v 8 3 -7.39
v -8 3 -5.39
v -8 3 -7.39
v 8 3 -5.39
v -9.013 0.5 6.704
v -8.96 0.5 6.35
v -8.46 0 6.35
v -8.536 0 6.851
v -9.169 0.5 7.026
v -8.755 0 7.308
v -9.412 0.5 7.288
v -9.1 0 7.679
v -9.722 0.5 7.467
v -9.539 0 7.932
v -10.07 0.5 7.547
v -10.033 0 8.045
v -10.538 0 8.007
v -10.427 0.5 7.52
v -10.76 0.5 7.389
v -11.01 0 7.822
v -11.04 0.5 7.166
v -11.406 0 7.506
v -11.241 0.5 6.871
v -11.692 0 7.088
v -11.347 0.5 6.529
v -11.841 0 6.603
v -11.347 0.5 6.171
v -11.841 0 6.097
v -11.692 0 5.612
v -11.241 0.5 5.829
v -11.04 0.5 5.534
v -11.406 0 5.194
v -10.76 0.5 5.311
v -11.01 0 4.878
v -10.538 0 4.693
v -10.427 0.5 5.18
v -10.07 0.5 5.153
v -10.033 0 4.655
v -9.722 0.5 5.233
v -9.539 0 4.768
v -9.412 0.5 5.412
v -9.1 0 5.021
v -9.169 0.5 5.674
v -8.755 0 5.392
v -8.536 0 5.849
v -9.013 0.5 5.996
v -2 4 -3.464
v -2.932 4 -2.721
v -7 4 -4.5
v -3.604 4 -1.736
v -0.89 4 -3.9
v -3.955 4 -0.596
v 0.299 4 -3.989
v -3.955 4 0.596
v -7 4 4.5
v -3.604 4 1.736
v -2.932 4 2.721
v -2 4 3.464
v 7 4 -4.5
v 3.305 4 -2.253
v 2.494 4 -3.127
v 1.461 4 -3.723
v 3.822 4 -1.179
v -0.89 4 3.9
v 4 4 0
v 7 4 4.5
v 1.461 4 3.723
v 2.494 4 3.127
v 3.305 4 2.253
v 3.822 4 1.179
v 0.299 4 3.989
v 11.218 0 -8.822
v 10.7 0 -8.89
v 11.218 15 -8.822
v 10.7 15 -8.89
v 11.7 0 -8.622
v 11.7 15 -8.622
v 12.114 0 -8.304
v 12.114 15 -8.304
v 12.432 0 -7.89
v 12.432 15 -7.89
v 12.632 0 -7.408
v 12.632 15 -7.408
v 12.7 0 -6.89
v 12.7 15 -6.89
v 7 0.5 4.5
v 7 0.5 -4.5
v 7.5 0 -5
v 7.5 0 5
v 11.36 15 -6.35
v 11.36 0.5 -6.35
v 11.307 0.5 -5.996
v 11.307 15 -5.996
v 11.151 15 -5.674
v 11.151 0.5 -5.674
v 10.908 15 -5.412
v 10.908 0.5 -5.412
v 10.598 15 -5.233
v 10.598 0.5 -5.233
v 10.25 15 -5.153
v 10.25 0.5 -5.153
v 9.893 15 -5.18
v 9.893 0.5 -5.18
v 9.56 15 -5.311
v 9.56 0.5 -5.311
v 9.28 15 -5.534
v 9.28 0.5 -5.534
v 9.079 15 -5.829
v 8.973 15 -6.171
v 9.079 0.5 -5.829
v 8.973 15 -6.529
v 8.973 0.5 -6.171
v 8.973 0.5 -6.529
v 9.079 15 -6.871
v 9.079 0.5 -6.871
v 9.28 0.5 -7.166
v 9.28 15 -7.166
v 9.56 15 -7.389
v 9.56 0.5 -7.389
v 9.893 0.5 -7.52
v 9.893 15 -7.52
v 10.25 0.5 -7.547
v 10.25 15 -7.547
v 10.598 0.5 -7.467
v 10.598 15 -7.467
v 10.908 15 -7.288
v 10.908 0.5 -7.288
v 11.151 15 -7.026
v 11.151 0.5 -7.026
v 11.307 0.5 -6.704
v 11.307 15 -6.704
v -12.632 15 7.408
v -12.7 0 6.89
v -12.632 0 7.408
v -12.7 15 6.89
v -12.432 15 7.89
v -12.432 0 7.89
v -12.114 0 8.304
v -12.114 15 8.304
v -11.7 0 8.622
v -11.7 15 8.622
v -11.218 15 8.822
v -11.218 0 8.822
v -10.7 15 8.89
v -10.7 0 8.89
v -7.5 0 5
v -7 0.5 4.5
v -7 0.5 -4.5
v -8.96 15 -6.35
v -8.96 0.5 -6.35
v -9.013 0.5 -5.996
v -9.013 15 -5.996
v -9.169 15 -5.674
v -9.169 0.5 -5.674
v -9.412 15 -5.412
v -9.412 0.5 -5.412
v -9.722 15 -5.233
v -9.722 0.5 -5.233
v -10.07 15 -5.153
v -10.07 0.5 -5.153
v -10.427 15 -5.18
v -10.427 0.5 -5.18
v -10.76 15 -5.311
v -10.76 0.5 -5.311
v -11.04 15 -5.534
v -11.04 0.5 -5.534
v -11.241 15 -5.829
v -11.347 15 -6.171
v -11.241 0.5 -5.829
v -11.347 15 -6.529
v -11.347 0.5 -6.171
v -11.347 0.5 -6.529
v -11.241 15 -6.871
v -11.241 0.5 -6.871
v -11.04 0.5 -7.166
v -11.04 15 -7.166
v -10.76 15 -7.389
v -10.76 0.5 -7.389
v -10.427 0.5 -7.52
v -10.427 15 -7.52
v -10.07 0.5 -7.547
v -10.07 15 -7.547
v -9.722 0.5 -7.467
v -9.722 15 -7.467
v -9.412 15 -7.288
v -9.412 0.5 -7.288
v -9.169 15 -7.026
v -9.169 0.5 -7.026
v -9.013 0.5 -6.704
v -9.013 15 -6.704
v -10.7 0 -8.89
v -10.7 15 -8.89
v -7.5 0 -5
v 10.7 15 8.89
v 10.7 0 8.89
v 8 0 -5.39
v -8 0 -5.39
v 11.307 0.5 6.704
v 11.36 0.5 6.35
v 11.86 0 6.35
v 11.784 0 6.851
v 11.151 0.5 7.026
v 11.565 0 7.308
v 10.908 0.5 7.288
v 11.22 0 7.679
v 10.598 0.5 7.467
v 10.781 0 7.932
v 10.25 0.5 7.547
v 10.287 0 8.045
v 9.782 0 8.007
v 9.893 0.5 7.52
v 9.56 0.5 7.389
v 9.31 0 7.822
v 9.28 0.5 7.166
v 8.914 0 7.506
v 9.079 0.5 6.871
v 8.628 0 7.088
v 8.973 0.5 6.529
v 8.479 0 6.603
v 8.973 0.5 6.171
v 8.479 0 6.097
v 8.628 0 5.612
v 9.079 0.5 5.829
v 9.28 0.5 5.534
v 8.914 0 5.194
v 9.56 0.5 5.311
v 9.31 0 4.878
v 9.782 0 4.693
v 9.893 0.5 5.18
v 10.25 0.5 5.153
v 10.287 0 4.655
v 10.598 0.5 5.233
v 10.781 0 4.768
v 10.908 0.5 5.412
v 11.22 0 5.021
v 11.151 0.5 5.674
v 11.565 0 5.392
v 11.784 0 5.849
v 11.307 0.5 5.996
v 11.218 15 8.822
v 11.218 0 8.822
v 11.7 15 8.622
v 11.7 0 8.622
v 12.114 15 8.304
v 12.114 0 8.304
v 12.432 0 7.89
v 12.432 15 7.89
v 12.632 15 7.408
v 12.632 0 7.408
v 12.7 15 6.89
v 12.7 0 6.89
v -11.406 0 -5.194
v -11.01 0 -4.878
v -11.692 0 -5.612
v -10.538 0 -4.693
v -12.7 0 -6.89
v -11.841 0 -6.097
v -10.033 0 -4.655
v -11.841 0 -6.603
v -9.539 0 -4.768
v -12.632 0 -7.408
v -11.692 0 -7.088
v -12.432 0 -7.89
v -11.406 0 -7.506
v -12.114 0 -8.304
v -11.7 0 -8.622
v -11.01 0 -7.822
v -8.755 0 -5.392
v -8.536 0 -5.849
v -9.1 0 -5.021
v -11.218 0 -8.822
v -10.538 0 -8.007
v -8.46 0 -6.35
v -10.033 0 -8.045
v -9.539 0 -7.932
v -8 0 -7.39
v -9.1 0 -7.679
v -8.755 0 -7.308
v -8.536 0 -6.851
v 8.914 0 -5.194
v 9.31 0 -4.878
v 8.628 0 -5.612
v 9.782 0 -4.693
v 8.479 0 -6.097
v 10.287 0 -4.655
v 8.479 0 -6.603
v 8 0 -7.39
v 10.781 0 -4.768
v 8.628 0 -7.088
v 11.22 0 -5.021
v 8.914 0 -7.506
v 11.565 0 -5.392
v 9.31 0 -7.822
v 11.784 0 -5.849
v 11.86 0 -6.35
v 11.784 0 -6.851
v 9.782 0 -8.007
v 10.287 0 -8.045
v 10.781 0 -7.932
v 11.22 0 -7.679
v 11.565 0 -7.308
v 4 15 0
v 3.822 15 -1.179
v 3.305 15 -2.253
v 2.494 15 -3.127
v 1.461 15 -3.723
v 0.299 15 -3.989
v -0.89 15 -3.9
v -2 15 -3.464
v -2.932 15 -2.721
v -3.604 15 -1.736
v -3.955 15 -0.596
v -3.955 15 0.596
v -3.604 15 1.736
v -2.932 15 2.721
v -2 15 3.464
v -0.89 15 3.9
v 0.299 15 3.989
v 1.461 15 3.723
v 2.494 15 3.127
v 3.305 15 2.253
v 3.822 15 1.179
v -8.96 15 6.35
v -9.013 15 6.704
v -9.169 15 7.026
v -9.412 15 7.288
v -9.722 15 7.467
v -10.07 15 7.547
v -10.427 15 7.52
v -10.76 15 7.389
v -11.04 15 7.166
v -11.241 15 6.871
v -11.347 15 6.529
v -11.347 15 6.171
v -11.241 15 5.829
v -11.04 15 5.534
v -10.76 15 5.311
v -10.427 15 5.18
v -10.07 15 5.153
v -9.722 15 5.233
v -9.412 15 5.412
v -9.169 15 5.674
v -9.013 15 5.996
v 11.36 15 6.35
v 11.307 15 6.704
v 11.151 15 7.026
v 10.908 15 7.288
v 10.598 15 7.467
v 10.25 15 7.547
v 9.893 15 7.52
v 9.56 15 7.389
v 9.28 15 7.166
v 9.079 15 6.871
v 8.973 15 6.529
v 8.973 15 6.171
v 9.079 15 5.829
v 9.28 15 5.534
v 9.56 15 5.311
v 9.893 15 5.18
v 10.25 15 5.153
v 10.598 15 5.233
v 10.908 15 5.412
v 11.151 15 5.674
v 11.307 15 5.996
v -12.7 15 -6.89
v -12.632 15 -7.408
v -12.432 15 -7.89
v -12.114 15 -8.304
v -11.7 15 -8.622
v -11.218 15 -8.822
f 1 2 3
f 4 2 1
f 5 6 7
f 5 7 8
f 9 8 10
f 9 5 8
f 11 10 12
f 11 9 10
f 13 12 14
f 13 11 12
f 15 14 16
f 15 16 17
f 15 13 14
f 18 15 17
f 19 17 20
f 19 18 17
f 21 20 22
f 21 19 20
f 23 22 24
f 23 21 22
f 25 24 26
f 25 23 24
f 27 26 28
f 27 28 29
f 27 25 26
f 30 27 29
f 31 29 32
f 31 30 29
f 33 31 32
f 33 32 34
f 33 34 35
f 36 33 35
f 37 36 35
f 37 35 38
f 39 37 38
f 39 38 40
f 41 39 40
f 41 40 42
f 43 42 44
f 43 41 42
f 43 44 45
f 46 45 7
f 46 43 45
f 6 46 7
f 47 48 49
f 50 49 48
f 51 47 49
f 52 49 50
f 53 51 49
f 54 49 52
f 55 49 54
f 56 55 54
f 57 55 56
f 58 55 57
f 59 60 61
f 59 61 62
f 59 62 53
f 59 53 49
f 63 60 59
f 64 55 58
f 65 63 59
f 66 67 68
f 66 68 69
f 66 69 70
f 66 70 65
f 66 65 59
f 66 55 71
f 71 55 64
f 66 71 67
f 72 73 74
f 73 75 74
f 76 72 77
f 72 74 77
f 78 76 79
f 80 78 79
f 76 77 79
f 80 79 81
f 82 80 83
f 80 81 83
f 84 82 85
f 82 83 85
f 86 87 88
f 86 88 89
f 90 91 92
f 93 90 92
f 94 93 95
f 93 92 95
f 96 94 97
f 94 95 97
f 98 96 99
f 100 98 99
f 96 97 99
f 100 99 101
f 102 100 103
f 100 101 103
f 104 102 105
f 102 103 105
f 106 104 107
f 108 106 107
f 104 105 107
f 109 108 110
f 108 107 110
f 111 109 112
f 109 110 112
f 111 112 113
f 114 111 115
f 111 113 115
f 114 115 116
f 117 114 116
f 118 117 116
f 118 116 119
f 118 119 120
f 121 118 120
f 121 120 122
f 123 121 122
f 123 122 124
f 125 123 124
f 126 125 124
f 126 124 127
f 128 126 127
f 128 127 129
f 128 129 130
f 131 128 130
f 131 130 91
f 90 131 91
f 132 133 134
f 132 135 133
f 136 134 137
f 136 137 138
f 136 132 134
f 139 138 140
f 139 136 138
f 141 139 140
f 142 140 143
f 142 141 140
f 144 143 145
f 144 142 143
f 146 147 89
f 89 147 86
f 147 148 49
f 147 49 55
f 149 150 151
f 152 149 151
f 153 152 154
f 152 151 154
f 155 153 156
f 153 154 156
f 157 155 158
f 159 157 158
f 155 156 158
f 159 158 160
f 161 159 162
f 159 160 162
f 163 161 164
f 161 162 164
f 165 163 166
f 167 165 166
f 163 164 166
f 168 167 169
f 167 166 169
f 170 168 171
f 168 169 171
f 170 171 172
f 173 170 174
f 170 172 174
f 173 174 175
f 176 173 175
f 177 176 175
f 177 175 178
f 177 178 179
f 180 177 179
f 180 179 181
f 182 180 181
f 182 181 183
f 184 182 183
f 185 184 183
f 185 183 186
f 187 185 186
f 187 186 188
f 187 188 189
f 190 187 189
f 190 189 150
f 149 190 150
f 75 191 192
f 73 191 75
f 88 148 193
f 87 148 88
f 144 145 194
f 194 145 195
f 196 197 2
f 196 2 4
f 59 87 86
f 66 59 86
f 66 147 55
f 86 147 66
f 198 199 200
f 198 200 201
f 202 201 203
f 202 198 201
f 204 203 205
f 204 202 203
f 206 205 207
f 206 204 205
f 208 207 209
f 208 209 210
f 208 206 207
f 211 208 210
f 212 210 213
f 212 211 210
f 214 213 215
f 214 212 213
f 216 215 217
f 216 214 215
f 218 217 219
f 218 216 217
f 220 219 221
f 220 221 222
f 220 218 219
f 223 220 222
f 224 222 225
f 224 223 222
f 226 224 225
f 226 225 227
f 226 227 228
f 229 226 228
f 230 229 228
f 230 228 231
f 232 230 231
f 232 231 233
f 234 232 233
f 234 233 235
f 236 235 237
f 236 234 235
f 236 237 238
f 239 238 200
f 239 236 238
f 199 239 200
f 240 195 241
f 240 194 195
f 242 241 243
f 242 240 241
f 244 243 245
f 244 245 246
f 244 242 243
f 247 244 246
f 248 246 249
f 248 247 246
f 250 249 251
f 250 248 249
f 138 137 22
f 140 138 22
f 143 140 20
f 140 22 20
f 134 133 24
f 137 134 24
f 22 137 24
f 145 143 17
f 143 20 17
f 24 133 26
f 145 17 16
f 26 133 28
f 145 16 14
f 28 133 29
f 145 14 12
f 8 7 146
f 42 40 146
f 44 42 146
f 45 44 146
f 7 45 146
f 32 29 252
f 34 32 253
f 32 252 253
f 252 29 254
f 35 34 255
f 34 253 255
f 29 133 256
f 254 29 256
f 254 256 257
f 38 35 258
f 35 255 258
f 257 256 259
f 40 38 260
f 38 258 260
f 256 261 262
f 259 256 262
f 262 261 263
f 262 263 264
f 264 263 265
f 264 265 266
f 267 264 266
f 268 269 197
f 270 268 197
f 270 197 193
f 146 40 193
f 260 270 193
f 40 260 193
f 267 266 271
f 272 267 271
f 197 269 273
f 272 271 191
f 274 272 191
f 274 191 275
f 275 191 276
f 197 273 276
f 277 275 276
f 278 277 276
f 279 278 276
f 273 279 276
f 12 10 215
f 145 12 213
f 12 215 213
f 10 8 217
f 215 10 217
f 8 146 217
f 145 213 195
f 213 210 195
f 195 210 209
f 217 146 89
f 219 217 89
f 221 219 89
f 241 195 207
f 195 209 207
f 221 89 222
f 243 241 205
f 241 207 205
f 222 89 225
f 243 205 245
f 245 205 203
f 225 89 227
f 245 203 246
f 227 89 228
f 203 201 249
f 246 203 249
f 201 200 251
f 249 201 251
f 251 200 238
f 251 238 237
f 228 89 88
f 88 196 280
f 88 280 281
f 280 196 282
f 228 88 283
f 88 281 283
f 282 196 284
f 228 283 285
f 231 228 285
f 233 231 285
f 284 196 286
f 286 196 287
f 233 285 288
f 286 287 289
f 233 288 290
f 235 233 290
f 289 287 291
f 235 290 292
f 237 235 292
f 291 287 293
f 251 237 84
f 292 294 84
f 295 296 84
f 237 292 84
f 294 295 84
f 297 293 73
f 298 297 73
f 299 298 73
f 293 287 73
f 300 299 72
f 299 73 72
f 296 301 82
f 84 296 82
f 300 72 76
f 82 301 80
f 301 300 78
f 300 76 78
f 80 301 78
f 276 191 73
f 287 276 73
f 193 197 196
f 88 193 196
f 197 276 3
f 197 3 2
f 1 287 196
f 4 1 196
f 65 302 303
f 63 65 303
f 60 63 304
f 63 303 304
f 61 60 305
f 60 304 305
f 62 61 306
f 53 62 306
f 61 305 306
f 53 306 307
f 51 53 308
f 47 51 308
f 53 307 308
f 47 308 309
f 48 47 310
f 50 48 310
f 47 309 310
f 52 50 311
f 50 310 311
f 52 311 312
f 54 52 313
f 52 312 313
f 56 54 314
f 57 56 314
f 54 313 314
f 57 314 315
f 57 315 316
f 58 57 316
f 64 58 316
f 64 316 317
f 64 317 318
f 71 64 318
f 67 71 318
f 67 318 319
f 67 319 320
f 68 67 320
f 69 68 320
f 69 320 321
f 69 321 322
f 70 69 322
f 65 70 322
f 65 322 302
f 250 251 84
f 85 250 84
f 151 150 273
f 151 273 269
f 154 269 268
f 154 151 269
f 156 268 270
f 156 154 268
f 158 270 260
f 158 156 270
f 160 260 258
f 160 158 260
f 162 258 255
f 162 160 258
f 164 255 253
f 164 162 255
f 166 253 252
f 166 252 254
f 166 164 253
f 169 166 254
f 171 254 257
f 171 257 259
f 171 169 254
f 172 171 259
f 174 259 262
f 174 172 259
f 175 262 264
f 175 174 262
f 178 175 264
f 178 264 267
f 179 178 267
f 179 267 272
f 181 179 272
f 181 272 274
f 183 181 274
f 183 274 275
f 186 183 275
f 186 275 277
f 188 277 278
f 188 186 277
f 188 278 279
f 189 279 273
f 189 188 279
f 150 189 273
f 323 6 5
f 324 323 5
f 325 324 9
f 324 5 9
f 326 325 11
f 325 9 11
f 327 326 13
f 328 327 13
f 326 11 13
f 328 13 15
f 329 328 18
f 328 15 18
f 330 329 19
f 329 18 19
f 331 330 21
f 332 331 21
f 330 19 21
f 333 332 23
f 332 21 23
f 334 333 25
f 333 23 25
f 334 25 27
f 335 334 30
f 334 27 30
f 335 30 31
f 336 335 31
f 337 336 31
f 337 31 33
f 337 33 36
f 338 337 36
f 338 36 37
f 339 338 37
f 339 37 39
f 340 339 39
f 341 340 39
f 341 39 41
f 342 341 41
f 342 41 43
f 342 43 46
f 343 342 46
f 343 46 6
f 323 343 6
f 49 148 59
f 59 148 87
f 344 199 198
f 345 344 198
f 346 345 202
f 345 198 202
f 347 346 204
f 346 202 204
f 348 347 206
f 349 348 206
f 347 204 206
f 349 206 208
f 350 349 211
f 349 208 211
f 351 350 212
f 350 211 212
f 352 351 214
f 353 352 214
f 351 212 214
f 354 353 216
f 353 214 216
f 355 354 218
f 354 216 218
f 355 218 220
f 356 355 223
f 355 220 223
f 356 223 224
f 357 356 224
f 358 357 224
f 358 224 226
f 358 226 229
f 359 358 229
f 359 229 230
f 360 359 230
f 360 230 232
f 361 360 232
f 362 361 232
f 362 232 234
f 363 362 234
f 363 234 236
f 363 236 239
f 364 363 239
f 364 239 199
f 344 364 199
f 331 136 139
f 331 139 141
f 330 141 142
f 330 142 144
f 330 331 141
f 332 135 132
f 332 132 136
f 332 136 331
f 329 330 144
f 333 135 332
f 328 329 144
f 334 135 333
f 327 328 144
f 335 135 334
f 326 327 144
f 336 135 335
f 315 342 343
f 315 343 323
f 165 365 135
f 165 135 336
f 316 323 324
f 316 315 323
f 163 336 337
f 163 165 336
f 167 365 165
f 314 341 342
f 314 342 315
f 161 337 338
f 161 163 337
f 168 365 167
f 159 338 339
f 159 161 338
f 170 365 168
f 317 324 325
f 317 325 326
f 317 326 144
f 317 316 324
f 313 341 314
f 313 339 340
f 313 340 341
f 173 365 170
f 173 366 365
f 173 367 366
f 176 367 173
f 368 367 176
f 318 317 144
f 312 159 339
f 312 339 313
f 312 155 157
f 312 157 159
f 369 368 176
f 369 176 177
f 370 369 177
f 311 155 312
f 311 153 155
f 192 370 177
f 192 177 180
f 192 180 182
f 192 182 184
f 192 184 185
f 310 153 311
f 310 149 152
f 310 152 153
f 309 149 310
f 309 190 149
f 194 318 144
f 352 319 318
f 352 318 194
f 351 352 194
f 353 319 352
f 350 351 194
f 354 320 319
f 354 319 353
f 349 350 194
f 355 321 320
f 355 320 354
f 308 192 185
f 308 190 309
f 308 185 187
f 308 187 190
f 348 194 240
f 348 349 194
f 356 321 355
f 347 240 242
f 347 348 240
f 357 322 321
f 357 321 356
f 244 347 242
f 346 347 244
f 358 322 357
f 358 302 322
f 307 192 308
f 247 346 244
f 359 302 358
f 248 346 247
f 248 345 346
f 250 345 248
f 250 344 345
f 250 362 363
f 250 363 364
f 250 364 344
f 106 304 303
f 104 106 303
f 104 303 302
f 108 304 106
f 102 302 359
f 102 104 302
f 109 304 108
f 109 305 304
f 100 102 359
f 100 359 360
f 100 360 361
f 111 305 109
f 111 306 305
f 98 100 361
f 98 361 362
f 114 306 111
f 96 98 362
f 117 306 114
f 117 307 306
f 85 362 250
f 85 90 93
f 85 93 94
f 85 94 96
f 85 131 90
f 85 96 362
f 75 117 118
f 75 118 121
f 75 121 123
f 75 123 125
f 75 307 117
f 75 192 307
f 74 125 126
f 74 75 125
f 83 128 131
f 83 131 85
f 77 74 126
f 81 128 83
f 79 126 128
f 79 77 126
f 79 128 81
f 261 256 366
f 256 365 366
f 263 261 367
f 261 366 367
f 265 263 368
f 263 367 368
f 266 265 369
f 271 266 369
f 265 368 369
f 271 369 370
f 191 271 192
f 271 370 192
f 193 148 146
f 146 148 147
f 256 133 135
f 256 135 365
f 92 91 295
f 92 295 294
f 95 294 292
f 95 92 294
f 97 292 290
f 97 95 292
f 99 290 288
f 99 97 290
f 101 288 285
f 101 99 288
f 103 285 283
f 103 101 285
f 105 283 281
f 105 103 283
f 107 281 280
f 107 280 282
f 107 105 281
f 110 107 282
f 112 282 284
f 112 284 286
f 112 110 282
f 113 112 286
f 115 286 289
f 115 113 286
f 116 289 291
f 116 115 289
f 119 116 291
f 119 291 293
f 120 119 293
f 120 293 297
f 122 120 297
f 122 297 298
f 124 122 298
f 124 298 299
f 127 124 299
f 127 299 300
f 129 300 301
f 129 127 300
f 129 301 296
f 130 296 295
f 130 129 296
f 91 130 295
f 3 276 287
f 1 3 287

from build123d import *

# Parameters (mm, degrees)
SKETCH1_W               = 25.4
SKETCH1_H               = 17.78
BOSS_EXTRUDE1_DEPTH     = 15
SKETCH2_W               = 14
SKETCH2_H               = 9
CUT_EXTRUDE1_DEPTH      = 4
SKETCH3_R               = 4
CUT_EXTRUDE2_DEPTH      = 25
SKETCH4_R               = 1.2
CUT_EXTRUDE3_DEPTH      = 25
FILLET1_R               = 2
CHAMFER1_SIZE           = 0.5
SKETCH5_W               = 16
SKETCH5_H               = 2
CUT_EXTRUDE4_DEPTH      = 7
CUT_EXTRUDE4_DEPTH_BACK = 3


with BuildPart() as part:
    # Sketch1 → Boss-Extrude1 (new body)
    with BuildSketch(Plane(origin=(0, 0, 0), x_dir=(1, 0, 0), z_dir=(0, 1, 0))):
        Rectangle(SKETCH1_W, SKETCH1_H)
    extrude(amount=BOSS_EXTRUDE1_DEPTH)

    # Sketch2 → Cut-Extrude1 (cut)
    with BuildSketch(Plane.XZ):
        Rectangle(SKETCH2_W, SKETCH2_H)
    extrude(amount=-CUT_EXTRUDE1_DEPTH, mode=Mode.SUBTRACT)

    # Sketch3 → Cut-Extrude2 (cut)
    with BuildSketch(Plane(origin=(0, 15, 0), x_dir=(1, 0, 0), z_dir=(0, 1, 0))):
        Circle(SKETCH3_R)
    extrude(amount=-CUT_EXTRUDE2_DEPTH, mode=Mode.SUBTRACT)

    # Sketch4 → Cut-Extrude3 (cut)
    with BuildSketch(Plane.XZ):
        with Locations((-10.16, -6.35)):
            Circle(SKETCH4_R)
        with Locations((-10.16, 6.35)):
            Circle(SKETCH4_R)
        with Locations((10.16, 6.35)):
            Circle(SKETCH4_R)
        with Locations((10.16, -6.35)):
            Circle(SKETCH4_R)
    extrude(amount=-CUT_EXTRUDE3_DEPTH, mode=Mode.SUBTRACT)

    # Fillet1
    fillet1_edges = [part.edges().sort_by_distance(p)[0] for p in [
        (-12.7, 7.5, -8.89),
        (12.7, 7.5, -8.89),
        (12.7, 7.5, 8.89),
        (-12.7, 7.5, 8.89),
    ]]
    fillet(fillet1_edges, radius=FILLET1_R)

    # Chamfer1
    chamfer1_edges = [part.edges().sort_by_distance(p)[0] for p in [
        (7, 0, 0),
        (0, 0, 4.5),
        (-7, 0, 0),
        (0, 0, -4.5),
        (8.96, 0, -6.35),
        (8.96, 0, 6.35),
        (-11.36, 0, 6.35),
        (-11.36, 0, -6.35),
    ]]
    chamfer(chamfer1_edges, length=CHAMFER1_SIZE)

    # Sketch5 → Cut-Extrude4 (cut, two sides)
    with BuildSketch(Plane.XZ) as cut_extrude4_sk:
        with Locations((0, -6.39)):
            Rectangle(SKETCH5_W, SKETCH5_H)
    extrude(amount=CUT_EXTRUDE4_DEPTH, mode=Mode.SUBTRACT)
    extrude(cut_extrude4_sk.sketch, amount=-CUT_EXTRUDE4_DEPTH_BACK, mode=Mode.SUBTRACT)


solid = part.part
